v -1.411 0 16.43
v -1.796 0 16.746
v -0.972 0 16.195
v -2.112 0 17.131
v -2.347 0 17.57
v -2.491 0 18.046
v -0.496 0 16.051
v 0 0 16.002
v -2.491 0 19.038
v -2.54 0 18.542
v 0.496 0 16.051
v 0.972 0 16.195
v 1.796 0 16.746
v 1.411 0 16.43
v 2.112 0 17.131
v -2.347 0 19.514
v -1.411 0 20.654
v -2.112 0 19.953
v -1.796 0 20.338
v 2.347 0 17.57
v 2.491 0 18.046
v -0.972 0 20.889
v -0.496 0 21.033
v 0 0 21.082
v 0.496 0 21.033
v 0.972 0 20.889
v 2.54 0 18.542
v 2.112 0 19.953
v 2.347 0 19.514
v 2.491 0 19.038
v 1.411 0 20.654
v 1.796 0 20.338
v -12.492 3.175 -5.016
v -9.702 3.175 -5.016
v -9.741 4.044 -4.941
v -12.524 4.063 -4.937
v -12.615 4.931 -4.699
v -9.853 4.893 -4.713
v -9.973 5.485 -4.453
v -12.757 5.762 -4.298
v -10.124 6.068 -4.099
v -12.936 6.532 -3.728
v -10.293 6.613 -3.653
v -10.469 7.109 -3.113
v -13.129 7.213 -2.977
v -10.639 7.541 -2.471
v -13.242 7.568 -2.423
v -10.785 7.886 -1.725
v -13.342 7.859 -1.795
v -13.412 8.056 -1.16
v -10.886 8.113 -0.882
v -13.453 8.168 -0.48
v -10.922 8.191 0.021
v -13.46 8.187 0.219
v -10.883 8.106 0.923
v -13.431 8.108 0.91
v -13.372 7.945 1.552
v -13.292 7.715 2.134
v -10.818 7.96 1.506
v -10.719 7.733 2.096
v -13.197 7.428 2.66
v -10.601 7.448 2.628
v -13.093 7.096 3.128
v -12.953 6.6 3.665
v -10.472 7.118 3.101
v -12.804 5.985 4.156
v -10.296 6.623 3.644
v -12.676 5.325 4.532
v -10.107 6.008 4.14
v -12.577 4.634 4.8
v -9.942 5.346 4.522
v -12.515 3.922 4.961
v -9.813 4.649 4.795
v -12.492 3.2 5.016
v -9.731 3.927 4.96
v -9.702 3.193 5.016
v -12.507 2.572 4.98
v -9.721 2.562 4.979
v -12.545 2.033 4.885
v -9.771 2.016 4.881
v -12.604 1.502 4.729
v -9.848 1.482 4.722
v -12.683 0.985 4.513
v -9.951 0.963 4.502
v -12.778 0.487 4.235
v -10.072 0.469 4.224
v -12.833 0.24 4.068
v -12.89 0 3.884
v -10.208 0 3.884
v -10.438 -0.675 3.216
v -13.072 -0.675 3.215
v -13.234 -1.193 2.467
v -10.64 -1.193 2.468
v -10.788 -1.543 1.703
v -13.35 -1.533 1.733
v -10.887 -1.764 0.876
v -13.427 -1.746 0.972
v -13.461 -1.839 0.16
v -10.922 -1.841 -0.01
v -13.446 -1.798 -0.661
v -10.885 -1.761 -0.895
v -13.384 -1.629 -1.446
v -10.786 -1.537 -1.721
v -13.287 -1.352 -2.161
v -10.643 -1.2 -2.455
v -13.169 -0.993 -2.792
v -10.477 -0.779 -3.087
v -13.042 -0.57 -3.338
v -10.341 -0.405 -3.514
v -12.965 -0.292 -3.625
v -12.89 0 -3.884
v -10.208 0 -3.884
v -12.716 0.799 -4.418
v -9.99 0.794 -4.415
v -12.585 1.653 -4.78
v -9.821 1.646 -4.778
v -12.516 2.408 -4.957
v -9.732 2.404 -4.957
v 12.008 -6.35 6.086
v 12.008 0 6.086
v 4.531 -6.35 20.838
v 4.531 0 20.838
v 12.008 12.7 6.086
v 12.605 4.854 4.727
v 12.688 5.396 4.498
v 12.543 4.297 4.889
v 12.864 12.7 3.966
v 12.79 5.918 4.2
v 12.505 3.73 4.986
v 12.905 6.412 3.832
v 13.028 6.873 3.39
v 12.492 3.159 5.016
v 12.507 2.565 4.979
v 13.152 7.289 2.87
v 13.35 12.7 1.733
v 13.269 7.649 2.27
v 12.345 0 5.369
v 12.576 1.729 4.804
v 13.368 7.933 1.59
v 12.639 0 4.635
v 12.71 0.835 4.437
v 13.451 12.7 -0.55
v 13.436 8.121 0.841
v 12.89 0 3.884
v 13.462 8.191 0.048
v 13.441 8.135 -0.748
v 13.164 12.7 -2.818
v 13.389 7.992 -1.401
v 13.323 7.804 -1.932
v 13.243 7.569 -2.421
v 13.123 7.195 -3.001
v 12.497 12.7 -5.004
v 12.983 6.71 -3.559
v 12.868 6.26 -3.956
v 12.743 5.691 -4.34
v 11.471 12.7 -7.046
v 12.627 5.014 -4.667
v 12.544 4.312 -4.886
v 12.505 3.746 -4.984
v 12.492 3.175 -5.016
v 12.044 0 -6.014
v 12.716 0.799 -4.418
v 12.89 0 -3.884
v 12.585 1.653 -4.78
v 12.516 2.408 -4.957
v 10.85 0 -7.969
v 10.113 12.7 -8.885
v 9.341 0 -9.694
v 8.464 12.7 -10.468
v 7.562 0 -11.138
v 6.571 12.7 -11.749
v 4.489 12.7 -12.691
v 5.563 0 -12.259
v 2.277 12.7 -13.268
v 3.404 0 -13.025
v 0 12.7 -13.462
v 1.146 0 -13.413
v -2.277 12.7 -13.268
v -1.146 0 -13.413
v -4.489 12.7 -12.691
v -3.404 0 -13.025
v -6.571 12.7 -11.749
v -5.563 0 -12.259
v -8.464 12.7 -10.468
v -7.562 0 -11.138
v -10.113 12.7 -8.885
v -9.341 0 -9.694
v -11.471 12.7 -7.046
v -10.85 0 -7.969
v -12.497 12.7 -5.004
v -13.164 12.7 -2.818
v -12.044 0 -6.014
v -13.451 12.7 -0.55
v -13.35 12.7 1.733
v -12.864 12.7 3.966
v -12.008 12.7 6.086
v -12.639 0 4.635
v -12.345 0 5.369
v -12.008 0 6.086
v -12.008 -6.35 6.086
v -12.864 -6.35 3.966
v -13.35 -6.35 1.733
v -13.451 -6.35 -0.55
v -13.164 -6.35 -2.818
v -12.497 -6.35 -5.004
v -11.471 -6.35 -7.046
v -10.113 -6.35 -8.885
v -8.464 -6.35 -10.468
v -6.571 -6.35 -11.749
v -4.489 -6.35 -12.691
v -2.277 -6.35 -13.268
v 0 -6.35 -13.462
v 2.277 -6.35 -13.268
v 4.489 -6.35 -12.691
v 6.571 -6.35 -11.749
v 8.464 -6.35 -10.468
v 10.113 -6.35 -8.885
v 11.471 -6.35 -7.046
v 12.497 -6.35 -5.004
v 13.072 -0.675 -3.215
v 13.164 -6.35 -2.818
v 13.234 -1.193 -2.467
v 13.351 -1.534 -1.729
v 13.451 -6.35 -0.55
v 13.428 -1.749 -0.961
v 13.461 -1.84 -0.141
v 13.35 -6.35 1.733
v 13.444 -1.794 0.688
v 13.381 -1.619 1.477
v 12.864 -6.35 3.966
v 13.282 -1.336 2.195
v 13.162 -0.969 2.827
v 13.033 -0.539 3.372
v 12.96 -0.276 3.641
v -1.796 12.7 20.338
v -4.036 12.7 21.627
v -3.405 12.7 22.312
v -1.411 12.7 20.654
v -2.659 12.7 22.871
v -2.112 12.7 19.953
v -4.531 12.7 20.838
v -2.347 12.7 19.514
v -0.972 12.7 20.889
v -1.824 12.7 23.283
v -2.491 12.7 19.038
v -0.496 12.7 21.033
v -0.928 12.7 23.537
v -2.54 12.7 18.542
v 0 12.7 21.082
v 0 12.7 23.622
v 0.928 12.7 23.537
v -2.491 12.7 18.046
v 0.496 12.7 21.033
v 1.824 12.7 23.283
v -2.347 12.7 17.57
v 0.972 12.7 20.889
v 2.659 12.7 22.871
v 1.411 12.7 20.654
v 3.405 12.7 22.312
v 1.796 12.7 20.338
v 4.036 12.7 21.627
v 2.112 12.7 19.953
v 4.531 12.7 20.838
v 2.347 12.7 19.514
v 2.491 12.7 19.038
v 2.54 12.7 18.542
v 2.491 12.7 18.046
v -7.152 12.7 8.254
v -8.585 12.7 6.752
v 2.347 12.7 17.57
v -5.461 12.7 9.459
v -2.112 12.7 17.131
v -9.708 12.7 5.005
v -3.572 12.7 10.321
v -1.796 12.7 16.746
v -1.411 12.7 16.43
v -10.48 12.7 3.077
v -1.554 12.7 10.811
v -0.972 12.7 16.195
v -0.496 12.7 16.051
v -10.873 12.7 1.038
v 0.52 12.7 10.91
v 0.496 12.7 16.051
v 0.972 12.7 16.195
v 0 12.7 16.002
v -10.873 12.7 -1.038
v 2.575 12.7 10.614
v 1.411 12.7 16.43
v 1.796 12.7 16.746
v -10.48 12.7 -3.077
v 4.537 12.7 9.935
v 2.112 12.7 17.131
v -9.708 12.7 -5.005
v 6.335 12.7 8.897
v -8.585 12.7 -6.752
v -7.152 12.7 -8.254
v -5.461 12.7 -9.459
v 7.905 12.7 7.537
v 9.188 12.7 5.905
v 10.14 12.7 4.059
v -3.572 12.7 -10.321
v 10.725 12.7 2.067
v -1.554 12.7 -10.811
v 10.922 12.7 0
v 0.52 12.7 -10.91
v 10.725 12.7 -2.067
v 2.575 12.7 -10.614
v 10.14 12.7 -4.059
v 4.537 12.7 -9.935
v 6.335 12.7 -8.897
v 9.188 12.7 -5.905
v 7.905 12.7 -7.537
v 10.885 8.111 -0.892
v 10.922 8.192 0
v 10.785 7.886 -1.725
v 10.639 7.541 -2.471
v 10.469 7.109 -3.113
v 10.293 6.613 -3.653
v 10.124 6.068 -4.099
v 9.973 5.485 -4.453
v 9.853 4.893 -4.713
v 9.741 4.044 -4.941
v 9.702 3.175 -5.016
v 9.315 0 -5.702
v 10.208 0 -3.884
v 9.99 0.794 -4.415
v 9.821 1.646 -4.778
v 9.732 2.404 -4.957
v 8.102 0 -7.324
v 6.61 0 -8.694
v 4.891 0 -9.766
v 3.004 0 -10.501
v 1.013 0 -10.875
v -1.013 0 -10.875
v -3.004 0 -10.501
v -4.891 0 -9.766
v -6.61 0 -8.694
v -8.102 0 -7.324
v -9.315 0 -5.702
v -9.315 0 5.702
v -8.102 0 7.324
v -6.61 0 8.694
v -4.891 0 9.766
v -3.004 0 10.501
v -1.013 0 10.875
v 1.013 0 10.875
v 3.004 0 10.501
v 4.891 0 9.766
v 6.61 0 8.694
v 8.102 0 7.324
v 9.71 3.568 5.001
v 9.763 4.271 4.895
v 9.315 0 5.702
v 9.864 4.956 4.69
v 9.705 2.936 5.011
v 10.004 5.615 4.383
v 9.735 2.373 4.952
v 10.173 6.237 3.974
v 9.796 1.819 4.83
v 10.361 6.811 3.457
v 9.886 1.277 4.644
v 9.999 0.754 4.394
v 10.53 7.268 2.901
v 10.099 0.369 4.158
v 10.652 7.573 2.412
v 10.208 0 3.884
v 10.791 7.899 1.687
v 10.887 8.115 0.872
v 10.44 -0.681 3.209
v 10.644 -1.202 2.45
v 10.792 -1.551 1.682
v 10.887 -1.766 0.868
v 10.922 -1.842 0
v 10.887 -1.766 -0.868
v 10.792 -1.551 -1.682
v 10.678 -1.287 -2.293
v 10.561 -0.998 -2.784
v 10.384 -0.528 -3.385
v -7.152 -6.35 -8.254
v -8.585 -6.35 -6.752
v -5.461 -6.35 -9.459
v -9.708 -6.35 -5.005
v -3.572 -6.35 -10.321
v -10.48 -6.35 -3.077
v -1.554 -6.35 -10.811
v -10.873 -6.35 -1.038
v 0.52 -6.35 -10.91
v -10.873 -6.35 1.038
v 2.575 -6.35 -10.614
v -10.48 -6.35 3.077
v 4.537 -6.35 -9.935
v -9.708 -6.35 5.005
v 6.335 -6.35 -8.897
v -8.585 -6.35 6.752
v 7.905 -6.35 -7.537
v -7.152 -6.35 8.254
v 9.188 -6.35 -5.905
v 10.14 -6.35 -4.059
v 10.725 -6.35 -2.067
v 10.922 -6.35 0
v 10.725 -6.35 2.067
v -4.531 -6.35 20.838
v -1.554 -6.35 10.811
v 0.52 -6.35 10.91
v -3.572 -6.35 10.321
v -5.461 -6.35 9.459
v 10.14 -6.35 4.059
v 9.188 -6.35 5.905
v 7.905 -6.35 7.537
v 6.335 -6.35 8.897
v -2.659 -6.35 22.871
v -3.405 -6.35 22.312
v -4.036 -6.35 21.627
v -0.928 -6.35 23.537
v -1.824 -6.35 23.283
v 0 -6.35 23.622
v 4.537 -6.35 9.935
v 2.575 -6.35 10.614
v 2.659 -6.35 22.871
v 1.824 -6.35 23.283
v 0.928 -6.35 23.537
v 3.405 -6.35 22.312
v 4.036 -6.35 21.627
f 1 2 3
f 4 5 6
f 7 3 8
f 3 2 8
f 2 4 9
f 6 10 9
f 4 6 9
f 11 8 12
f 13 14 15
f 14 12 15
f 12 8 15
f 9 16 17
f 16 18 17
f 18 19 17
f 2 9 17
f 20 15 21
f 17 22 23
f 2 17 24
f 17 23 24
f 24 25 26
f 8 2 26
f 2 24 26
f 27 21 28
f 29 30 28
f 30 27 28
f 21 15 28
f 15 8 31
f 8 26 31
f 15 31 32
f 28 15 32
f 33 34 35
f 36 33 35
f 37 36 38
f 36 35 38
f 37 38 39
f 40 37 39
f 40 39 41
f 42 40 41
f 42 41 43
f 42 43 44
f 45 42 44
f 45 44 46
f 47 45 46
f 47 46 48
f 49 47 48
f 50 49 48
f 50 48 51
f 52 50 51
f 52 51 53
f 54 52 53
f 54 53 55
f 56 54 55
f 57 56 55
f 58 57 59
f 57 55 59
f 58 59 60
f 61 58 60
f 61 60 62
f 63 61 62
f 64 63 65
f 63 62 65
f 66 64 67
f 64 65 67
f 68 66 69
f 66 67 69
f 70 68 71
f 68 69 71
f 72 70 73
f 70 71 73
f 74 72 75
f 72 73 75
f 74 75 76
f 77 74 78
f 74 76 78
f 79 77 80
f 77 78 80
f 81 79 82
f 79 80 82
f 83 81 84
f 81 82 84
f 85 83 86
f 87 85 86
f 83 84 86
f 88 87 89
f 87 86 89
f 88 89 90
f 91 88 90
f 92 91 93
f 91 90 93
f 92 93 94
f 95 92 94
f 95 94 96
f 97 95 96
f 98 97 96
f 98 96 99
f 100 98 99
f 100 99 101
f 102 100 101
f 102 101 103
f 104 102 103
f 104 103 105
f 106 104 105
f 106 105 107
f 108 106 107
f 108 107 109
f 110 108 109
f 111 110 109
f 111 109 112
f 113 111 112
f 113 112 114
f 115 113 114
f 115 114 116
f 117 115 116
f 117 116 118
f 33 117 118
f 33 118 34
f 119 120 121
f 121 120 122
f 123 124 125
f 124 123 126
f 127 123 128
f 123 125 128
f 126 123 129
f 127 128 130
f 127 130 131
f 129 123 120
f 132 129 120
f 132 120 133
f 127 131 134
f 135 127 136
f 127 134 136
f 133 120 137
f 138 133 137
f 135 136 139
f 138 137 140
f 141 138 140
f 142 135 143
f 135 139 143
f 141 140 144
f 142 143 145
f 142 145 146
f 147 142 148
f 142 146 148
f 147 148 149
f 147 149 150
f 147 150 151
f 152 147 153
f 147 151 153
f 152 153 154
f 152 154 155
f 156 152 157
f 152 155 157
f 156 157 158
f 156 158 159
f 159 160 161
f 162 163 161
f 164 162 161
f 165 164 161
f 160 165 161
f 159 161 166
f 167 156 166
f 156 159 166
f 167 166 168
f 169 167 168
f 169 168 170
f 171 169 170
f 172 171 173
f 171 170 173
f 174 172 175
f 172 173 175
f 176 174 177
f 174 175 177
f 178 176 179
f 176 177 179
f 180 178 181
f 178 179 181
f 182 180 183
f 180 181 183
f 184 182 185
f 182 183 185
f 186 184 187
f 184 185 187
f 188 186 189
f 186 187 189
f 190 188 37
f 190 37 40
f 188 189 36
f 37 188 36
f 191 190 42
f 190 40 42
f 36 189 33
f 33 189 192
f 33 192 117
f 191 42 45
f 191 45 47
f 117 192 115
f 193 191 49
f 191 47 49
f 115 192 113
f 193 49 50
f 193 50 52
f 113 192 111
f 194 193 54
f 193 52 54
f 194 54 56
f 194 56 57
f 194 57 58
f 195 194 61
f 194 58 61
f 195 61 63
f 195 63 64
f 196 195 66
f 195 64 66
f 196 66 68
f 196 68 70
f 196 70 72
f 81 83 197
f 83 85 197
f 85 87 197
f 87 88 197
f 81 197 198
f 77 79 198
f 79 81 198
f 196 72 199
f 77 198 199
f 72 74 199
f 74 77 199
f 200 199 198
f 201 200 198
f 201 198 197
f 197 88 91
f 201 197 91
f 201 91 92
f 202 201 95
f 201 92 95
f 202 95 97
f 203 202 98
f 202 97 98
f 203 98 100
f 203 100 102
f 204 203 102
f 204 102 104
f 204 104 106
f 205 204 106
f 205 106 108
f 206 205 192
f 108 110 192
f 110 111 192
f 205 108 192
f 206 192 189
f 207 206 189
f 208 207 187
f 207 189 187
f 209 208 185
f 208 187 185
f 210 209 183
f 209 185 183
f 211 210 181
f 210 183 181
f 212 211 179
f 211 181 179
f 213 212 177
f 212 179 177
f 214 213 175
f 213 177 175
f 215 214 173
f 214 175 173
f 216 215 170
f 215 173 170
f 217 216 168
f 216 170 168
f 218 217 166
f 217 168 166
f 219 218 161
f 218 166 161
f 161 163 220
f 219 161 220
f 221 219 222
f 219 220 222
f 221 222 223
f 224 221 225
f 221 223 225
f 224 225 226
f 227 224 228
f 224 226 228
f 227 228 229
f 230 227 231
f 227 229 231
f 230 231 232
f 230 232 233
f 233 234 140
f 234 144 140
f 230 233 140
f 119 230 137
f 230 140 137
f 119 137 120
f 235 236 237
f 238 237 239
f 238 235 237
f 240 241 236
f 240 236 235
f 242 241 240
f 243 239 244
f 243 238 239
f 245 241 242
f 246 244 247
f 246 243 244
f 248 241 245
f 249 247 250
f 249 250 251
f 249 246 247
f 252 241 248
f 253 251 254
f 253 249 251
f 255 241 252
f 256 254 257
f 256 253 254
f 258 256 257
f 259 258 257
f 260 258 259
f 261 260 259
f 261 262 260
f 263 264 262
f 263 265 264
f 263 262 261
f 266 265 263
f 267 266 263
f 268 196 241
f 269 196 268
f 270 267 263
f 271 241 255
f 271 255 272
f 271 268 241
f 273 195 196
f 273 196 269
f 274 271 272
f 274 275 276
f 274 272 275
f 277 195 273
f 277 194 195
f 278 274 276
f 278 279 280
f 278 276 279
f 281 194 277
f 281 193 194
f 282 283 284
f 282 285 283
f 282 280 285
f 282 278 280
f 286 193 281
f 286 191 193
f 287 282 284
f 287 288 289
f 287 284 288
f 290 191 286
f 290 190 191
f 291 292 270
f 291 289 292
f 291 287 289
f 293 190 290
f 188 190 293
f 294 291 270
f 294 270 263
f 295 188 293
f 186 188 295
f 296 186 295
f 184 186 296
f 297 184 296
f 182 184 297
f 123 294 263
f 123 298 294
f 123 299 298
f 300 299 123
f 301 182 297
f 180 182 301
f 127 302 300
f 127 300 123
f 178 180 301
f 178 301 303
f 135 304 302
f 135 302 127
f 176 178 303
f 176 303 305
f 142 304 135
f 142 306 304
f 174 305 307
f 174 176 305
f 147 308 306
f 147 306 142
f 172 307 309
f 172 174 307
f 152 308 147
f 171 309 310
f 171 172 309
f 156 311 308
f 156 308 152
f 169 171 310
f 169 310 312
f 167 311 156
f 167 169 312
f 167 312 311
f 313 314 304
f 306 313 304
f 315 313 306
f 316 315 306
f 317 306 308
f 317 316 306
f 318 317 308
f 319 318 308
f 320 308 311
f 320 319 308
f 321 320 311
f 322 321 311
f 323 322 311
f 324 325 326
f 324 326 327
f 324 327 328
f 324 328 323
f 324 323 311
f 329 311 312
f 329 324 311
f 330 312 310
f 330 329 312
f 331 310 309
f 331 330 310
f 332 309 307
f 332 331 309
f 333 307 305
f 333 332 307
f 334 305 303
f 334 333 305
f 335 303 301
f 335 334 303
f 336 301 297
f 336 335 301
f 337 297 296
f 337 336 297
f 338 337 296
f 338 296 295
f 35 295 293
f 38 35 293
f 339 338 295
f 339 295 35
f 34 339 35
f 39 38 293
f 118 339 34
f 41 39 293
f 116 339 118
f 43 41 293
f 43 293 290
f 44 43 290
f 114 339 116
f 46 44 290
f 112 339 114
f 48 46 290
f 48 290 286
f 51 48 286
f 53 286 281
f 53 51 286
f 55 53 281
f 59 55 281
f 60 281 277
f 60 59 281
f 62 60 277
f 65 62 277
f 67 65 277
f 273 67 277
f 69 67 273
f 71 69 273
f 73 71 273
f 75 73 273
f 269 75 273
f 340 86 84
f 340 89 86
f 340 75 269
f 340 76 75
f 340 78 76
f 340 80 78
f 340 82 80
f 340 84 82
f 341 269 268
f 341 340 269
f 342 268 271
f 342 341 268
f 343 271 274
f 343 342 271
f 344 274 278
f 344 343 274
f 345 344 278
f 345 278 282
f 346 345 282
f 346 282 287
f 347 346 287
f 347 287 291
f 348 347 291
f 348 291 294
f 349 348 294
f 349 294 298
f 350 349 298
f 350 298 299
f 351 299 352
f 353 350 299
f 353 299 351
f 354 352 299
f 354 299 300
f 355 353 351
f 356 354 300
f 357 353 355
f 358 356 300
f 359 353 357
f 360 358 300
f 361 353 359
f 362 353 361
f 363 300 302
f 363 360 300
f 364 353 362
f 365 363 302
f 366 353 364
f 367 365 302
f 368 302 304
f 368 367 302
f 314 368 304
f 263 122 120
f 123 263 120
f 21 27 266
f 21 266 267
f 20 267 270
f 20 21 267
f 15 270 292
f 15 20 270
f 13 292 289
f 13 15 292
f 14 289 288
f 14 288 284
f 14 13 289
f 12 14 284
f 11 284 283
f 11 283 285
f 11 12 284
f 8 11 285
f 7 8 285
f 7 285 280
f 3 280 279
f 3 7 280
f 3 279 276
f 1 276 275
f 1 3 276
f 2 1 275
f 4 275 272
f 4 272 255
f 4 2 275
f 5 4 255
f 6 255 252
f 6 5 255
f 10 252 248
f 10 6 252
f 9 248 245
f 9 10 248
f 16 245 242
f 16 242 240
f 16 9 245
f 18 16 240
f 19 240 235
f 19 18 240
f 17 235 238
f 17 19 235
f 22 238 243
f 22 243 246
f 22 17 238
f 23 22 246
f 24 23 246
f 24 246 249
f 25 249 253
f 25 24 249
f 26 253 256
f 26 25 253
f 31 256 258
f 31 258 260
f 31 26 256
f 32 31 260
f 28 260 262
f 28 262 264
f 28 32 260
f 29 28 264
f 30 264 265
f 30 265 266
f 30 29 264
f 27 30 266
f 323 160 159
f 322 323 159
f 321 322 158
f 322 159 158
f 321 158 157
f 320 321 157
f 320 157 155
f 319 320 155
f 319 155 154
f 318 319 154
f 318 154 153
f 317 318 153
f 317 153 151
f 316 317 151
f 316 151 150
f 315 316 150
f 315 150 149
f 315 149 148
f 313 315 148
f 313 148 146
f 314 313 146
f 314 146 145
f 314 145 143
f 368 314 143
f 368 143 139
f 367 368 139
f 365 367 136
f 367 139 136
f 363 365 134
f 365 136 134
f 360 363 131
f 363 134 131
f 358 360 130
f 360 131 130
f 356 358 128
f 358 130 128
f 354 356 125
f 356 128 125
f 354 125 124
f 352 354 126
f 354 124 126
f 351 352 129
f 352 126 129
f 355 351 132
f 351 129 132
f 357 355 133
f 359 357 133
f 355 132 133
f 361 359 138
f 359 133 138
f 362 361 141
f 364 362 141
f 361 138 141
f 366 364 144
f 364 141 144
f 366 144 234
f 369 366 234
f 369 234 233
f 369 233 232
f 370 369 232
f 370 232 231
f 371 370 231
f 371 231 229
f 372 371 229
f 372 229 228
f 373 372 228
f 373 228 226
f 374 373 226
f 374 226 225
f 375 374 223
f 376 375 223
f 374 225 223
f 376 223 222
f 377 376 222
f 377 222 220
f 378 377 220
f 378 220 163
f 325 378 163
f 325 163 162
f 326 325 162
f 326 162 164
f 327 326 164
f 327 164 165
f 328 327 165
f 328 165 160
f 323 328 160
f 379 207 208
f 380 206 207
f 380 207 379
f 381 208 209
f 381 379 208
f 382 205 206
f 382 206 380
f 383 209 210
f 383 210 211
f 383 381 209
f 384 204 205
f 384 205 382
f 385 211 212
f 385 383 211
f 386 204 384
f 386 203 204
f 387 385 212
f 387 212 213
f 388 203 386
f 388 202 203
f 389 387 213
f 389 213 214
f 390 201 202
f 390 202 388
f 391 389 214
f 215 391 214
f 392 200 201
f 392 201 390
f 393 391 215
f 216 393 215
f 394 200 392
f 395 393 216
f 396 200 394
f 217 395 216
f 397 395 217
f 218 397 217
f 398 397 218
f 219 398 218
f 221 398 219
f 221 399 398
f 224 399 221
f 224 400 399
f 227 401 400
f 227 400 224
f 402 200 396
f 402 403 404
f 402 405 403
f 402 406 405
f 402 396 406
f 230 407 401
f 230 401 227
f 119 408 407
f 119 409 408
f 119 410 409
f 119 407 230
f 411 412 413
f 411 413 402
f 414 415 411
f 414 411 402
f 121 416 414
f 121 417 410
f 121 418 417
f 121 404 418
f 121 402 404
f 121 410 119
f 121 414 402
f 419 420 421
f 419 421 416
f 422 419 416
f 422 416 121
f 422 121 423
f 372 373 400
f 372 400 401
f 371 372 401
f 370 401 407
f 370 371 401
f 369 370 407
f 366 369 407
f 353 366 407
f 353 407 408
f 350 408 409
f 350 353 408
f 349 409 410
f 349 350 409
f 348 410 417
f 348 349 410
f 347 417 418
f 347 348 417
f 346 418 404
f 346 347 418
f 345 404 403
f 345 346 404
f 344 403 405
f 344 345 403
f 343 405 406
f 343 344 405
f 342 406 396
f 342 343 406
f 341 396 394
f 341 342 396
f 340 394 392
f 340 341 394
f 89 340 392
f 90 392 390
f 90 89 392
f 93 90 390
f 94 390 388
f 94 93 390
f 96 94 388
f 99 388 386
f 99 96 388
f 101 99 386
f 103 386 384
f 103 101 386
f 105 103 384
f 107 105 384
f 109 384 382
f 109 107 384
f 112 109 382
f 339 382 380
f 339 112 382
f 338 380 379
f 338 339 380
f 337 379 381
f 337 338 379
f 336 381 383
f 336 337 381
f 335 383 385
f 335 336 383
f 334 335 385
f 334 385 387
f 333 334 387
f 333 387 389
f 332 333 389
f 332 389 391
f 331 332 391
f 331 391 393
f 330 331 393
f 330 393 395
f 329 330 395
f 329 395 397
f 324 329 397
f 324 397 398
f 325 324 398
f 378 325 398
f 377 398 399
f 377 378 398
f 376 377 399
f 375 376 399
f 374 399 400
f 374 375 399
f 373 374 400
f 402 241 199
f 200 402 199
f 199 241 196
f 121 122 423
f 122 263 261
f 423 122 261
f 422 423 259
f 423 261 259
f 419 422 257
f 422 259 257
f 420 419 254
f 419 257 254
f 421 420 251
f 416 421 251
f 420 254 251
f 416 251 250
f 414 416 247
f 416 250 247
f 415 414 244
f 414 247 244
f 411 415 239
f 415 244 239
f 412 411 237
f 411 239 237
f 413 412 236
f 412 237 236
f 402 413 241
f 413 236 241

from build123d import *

# Parameters (mm, degrees)
SKETCH1_R           = 10.922
SKETCH1_R_2         = 2.54
BOSS_EXTRUDE1_DEPTH = 12.7
SKETCH2_R           = 10.922
SKETCH2_R_2         = 2.54
BOSS_EXTRUDE2_DEPTH = 6.35
SKETCH3_R           = 5.0165
CUT_EXTRUDE1_DEPTH  = 27.924


with BuildPart() as part:
    # Sketch1 → Boss-Extrude1 (new body)
    with BuildSketch(Plane(origin=(0, 0, 0), x_dir=(1, 0, 0), z_dir=(0, 1, 0))):
        with BuildLine():
            Line((-12.007971664, -6.085561644), (-4.531310062, -20.838438356))
            ThreePointArc((-4.531310062, -20.838438356), (0, -23.622), (4.531310062, -20.838438356))
            Line((4.531310062, -20.838438356), (12.007971664, -6.085561644))
            ThreePointArc((12.007971664, -6.085561644), (0, 13.462), (-12.007971664, -6.085561644))
        make_face()
        Circle(SKETCH1_R, mode=Mode.SUBTRACT)
        with Locations((0, -18.542)):
            Circle(SKETCH1_R_2, mode=Mode.SUBTRACT)
    extrude(amount=BOSS_EXTRUDE1_DEPTH)

    # Sketch2 → Boss-Extrude2 (add)
    with BuildSketch(Plane.XZ):
        with BuildLine():
            Line((-4.531310062, 20.838438356), (-12.007971664, 6.085561644))
            ThreePointArc((-12.007971664, 6.085561644), (0, -13.462), (12.007971664, 6.085561644))
            Line((12.007971664, 6.085561644), (4.531310062, 20.838438356))
            ThreePointArc((4.531310062, 20.838438356), (0, 23.622), (-4.531310062, 20.838438356))
        make_face()
        Circle(SKETCH2_R, mode=Mode.SUBTRACT)
        with Locations((0, 18.542)):
            Circle(SKETCH2_R_2, mode=Mode.SUBTRACT)
        with Locations((0, 18.542)):
            Circle(SKETCH2_R_2)
    extrude(amount=BOSS_EXTRUDE2_DEPTH)

    # Sketch3 → Cut-Extrude1 (cut, through all)
    with BuildSketch(Plane(origin=(13.462, 0, 0), x_dir=(0, 0, -1), z_dir=(1, 0, 0))):
        with Locations((0, 3.175)):
            Circle(SKETCH3_R)
    extrude(amount=-CUT_EXTRUDE1_DEPTH, mode=Mode.SUBTRACT)


solid = part.part
